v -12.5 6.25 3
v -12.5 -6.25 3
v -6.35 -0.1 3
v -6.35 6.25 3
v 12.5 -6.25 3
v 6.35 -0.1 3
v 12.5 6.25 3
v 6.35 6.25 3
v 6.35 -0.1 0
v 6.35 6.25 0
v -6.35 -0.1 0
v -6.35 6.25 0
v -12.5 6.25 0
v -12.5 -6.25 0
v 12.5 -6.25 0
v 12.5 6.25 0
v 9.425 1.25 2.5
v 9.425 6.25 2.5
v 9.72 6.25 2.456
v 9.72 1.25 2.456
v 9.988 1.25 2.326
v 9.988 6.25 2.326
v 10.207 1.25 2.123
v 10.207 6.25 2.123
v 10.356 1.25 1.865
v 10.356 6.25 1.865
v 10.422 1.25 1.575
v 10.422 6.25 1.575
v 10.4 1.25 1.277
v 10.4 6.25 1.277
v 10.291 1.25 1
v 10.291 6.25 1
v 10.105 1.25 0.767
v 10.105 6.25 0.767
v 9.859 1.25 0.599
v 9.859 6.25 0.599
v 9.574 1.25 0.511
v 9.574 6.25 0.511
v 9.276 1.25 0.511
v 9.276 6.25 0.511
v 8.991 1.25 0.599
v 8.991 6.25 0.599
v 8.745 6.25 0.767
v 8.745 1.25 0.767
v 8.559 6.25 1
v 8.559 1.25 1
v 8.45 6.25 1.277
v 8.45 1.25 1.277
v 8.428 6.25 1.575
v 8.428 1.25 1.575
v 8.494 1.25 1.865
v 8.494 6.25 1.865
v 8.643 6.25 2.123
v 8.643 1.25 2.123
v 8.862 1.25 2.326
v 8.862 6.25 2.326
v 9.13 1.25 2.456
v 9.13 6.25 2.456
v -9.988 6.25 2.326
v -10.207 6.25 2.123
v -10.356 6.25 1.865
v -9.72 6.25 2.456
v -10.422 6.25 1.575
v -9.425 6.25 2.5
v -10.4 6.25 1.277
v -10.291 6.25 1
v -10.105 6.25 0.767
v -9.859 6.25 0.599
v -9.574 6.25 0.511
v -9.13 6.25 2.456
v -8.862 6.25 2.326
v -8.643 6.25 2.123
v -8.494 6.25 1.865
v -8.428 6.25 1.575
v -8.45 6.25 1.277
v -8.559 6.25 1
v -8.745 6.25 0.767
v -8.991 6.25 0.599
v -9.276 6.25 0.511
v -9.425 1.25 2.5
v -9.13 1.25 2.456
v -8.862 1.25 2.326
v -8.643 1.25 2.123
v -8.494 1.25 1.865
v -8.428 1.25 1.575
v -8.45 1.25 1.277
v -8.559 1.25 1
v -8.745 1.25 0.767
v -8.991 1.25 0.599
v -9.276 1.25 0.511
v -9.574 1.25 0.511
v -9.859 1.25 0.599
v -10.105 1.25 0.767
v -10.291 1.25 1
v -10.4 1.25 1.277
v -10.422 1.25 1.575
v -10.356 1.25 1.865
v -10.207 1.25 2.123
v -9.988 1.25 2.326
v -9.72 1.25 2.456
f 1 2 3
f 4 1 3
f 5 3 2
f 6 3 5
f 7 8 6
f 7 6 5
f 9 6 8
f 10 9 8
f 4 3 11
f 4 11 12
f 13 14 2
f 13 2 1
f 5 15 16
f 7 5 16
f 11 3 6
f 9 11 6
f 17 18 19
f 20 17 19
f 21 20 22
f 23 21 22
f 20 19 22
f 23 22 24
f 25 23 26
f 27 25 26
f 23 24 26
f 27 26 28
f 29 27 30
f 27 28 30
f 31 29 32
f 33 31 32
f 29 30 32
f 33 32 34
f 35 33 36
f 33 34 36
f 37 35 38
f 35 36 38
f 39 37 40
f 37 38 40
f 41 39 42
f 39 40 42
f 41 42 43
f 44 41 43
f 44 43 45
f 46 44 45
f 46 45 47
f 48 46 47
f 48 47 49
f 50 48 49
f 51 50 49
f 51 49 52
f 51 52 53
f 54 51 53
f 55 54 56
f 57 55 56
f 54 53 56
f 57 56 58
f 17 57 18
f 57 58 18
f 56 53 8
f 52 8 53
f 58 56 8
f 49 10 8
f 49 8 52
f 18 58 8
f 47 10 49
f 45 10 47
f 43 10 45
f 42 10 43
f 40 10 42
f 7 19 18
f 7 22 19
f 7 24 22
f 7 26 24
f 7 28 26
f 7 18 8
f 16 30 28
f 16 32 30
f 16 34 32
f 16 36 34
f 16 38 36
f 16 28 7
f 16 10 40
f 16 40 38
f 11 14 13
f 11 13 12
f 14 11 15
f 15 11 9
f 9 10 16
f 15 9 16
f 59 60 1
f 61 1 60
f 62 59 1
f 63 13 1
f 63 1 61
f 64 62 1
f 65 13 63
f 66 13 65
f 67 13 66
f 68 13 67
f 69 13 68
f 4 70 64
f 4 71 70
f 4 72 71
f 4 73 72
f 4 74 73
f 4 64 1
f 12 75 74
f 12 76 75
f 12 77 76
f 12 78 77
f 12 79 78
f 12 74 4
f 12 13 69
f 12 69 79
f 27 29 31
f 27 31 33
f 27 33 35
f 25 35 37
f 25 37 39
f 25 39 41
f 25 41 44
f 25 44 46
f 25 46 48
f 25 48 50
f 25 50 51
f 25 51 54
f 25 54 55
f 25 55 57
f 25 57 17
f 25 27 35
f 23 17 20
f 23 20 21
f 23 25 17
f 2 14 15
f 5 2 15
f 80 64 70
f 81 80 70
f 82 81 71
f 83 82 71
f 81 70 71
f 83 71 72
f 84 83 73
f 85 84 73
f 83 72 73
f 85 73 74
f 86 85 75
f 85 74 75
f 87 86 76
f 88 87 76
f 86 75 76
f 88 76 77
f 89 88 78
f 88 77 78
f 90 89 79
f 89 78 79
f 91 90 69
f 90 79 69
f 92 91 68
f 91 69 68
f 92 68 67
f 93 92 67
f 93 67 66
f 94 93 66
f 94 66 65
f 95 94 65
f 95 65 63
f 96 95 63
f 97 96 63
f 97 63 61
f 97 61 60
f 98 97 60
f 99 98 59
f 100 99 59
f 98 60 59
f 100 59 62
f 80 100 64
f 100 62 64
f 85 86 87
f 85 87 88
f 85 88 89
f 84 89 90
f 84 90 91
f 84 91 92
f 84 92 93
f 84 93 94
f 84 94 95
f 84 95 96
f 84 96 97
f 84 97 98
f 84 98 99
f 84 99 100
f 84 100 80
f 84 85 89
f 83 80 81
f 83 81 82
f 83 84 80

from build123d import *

# Parameters (mm, degrees)
SKETCH1_W           = 25
SKETCH1_H           = 12.5
BOSS_EXTRUDE1_DEPTH = 3
SKETCH2_W           = 12.7
SKETCH2_H           = 6.35
CUT_EXTRUDE1_DEPTH  = 3
SKETCH3_R           = 1
CUT_EXTRUDE2_DEPTH  = 5
SKETCH4_R           = 1
CUT_EXTRUDE3_DEPTH  = 5


with BuildPart() as part:
    # Sketch1 → Boss-Extrude1 (new body)
    with BuildSketch(Plane.XY):
        Rectangle(SKETCH1_W, SKETCH1_H)
    extrude(amount=BOSS_EXTRUDE1_DEPTH)

    # Sketch2 → Cut-Extrude1 (cut)
    with BuildSketch(Plane.XY.offset(3)):
        with Locations((0, 3.075)):
            Rectangle(SKETCH2_W, SKETCH2_H)
    extrude(amount=-CUT_EXTRUDE1_DEPTH, mode=Mode.SUBTRACT)

    # Sketch3 → Cut-Extrude2 (cut)
    with BuildSketch(Plane(origin=(0, 6.25, 0), x_dir=(1, 0, 0), z_dir=(0, 1, 0))):
        with Locations(Location((-9.425, -1.5, 0), (0, 0, 270))):
            Circle(SKETCH3_R)
    extrude(amount=-CUT_EXTRUDE2_DEPTH, mode=Mode.SUBTRACT)

    # Sketch4 → Cut-Extrude3 (cut)
    with BuildSketch(Plane(origin=(0, 6.25, 0), x_dir=(1, 0, 0), z_dir=(0, 1, 0))):
        with Locations(Location((9.425, -1.5, 0), (0, 0, 270))):
            Circle(SKETCH4_R)
    extrude(amount=-CUT_EXTRUDE3_DEPTH, mode=Mode.SUBTRACT)


solid = part.part
